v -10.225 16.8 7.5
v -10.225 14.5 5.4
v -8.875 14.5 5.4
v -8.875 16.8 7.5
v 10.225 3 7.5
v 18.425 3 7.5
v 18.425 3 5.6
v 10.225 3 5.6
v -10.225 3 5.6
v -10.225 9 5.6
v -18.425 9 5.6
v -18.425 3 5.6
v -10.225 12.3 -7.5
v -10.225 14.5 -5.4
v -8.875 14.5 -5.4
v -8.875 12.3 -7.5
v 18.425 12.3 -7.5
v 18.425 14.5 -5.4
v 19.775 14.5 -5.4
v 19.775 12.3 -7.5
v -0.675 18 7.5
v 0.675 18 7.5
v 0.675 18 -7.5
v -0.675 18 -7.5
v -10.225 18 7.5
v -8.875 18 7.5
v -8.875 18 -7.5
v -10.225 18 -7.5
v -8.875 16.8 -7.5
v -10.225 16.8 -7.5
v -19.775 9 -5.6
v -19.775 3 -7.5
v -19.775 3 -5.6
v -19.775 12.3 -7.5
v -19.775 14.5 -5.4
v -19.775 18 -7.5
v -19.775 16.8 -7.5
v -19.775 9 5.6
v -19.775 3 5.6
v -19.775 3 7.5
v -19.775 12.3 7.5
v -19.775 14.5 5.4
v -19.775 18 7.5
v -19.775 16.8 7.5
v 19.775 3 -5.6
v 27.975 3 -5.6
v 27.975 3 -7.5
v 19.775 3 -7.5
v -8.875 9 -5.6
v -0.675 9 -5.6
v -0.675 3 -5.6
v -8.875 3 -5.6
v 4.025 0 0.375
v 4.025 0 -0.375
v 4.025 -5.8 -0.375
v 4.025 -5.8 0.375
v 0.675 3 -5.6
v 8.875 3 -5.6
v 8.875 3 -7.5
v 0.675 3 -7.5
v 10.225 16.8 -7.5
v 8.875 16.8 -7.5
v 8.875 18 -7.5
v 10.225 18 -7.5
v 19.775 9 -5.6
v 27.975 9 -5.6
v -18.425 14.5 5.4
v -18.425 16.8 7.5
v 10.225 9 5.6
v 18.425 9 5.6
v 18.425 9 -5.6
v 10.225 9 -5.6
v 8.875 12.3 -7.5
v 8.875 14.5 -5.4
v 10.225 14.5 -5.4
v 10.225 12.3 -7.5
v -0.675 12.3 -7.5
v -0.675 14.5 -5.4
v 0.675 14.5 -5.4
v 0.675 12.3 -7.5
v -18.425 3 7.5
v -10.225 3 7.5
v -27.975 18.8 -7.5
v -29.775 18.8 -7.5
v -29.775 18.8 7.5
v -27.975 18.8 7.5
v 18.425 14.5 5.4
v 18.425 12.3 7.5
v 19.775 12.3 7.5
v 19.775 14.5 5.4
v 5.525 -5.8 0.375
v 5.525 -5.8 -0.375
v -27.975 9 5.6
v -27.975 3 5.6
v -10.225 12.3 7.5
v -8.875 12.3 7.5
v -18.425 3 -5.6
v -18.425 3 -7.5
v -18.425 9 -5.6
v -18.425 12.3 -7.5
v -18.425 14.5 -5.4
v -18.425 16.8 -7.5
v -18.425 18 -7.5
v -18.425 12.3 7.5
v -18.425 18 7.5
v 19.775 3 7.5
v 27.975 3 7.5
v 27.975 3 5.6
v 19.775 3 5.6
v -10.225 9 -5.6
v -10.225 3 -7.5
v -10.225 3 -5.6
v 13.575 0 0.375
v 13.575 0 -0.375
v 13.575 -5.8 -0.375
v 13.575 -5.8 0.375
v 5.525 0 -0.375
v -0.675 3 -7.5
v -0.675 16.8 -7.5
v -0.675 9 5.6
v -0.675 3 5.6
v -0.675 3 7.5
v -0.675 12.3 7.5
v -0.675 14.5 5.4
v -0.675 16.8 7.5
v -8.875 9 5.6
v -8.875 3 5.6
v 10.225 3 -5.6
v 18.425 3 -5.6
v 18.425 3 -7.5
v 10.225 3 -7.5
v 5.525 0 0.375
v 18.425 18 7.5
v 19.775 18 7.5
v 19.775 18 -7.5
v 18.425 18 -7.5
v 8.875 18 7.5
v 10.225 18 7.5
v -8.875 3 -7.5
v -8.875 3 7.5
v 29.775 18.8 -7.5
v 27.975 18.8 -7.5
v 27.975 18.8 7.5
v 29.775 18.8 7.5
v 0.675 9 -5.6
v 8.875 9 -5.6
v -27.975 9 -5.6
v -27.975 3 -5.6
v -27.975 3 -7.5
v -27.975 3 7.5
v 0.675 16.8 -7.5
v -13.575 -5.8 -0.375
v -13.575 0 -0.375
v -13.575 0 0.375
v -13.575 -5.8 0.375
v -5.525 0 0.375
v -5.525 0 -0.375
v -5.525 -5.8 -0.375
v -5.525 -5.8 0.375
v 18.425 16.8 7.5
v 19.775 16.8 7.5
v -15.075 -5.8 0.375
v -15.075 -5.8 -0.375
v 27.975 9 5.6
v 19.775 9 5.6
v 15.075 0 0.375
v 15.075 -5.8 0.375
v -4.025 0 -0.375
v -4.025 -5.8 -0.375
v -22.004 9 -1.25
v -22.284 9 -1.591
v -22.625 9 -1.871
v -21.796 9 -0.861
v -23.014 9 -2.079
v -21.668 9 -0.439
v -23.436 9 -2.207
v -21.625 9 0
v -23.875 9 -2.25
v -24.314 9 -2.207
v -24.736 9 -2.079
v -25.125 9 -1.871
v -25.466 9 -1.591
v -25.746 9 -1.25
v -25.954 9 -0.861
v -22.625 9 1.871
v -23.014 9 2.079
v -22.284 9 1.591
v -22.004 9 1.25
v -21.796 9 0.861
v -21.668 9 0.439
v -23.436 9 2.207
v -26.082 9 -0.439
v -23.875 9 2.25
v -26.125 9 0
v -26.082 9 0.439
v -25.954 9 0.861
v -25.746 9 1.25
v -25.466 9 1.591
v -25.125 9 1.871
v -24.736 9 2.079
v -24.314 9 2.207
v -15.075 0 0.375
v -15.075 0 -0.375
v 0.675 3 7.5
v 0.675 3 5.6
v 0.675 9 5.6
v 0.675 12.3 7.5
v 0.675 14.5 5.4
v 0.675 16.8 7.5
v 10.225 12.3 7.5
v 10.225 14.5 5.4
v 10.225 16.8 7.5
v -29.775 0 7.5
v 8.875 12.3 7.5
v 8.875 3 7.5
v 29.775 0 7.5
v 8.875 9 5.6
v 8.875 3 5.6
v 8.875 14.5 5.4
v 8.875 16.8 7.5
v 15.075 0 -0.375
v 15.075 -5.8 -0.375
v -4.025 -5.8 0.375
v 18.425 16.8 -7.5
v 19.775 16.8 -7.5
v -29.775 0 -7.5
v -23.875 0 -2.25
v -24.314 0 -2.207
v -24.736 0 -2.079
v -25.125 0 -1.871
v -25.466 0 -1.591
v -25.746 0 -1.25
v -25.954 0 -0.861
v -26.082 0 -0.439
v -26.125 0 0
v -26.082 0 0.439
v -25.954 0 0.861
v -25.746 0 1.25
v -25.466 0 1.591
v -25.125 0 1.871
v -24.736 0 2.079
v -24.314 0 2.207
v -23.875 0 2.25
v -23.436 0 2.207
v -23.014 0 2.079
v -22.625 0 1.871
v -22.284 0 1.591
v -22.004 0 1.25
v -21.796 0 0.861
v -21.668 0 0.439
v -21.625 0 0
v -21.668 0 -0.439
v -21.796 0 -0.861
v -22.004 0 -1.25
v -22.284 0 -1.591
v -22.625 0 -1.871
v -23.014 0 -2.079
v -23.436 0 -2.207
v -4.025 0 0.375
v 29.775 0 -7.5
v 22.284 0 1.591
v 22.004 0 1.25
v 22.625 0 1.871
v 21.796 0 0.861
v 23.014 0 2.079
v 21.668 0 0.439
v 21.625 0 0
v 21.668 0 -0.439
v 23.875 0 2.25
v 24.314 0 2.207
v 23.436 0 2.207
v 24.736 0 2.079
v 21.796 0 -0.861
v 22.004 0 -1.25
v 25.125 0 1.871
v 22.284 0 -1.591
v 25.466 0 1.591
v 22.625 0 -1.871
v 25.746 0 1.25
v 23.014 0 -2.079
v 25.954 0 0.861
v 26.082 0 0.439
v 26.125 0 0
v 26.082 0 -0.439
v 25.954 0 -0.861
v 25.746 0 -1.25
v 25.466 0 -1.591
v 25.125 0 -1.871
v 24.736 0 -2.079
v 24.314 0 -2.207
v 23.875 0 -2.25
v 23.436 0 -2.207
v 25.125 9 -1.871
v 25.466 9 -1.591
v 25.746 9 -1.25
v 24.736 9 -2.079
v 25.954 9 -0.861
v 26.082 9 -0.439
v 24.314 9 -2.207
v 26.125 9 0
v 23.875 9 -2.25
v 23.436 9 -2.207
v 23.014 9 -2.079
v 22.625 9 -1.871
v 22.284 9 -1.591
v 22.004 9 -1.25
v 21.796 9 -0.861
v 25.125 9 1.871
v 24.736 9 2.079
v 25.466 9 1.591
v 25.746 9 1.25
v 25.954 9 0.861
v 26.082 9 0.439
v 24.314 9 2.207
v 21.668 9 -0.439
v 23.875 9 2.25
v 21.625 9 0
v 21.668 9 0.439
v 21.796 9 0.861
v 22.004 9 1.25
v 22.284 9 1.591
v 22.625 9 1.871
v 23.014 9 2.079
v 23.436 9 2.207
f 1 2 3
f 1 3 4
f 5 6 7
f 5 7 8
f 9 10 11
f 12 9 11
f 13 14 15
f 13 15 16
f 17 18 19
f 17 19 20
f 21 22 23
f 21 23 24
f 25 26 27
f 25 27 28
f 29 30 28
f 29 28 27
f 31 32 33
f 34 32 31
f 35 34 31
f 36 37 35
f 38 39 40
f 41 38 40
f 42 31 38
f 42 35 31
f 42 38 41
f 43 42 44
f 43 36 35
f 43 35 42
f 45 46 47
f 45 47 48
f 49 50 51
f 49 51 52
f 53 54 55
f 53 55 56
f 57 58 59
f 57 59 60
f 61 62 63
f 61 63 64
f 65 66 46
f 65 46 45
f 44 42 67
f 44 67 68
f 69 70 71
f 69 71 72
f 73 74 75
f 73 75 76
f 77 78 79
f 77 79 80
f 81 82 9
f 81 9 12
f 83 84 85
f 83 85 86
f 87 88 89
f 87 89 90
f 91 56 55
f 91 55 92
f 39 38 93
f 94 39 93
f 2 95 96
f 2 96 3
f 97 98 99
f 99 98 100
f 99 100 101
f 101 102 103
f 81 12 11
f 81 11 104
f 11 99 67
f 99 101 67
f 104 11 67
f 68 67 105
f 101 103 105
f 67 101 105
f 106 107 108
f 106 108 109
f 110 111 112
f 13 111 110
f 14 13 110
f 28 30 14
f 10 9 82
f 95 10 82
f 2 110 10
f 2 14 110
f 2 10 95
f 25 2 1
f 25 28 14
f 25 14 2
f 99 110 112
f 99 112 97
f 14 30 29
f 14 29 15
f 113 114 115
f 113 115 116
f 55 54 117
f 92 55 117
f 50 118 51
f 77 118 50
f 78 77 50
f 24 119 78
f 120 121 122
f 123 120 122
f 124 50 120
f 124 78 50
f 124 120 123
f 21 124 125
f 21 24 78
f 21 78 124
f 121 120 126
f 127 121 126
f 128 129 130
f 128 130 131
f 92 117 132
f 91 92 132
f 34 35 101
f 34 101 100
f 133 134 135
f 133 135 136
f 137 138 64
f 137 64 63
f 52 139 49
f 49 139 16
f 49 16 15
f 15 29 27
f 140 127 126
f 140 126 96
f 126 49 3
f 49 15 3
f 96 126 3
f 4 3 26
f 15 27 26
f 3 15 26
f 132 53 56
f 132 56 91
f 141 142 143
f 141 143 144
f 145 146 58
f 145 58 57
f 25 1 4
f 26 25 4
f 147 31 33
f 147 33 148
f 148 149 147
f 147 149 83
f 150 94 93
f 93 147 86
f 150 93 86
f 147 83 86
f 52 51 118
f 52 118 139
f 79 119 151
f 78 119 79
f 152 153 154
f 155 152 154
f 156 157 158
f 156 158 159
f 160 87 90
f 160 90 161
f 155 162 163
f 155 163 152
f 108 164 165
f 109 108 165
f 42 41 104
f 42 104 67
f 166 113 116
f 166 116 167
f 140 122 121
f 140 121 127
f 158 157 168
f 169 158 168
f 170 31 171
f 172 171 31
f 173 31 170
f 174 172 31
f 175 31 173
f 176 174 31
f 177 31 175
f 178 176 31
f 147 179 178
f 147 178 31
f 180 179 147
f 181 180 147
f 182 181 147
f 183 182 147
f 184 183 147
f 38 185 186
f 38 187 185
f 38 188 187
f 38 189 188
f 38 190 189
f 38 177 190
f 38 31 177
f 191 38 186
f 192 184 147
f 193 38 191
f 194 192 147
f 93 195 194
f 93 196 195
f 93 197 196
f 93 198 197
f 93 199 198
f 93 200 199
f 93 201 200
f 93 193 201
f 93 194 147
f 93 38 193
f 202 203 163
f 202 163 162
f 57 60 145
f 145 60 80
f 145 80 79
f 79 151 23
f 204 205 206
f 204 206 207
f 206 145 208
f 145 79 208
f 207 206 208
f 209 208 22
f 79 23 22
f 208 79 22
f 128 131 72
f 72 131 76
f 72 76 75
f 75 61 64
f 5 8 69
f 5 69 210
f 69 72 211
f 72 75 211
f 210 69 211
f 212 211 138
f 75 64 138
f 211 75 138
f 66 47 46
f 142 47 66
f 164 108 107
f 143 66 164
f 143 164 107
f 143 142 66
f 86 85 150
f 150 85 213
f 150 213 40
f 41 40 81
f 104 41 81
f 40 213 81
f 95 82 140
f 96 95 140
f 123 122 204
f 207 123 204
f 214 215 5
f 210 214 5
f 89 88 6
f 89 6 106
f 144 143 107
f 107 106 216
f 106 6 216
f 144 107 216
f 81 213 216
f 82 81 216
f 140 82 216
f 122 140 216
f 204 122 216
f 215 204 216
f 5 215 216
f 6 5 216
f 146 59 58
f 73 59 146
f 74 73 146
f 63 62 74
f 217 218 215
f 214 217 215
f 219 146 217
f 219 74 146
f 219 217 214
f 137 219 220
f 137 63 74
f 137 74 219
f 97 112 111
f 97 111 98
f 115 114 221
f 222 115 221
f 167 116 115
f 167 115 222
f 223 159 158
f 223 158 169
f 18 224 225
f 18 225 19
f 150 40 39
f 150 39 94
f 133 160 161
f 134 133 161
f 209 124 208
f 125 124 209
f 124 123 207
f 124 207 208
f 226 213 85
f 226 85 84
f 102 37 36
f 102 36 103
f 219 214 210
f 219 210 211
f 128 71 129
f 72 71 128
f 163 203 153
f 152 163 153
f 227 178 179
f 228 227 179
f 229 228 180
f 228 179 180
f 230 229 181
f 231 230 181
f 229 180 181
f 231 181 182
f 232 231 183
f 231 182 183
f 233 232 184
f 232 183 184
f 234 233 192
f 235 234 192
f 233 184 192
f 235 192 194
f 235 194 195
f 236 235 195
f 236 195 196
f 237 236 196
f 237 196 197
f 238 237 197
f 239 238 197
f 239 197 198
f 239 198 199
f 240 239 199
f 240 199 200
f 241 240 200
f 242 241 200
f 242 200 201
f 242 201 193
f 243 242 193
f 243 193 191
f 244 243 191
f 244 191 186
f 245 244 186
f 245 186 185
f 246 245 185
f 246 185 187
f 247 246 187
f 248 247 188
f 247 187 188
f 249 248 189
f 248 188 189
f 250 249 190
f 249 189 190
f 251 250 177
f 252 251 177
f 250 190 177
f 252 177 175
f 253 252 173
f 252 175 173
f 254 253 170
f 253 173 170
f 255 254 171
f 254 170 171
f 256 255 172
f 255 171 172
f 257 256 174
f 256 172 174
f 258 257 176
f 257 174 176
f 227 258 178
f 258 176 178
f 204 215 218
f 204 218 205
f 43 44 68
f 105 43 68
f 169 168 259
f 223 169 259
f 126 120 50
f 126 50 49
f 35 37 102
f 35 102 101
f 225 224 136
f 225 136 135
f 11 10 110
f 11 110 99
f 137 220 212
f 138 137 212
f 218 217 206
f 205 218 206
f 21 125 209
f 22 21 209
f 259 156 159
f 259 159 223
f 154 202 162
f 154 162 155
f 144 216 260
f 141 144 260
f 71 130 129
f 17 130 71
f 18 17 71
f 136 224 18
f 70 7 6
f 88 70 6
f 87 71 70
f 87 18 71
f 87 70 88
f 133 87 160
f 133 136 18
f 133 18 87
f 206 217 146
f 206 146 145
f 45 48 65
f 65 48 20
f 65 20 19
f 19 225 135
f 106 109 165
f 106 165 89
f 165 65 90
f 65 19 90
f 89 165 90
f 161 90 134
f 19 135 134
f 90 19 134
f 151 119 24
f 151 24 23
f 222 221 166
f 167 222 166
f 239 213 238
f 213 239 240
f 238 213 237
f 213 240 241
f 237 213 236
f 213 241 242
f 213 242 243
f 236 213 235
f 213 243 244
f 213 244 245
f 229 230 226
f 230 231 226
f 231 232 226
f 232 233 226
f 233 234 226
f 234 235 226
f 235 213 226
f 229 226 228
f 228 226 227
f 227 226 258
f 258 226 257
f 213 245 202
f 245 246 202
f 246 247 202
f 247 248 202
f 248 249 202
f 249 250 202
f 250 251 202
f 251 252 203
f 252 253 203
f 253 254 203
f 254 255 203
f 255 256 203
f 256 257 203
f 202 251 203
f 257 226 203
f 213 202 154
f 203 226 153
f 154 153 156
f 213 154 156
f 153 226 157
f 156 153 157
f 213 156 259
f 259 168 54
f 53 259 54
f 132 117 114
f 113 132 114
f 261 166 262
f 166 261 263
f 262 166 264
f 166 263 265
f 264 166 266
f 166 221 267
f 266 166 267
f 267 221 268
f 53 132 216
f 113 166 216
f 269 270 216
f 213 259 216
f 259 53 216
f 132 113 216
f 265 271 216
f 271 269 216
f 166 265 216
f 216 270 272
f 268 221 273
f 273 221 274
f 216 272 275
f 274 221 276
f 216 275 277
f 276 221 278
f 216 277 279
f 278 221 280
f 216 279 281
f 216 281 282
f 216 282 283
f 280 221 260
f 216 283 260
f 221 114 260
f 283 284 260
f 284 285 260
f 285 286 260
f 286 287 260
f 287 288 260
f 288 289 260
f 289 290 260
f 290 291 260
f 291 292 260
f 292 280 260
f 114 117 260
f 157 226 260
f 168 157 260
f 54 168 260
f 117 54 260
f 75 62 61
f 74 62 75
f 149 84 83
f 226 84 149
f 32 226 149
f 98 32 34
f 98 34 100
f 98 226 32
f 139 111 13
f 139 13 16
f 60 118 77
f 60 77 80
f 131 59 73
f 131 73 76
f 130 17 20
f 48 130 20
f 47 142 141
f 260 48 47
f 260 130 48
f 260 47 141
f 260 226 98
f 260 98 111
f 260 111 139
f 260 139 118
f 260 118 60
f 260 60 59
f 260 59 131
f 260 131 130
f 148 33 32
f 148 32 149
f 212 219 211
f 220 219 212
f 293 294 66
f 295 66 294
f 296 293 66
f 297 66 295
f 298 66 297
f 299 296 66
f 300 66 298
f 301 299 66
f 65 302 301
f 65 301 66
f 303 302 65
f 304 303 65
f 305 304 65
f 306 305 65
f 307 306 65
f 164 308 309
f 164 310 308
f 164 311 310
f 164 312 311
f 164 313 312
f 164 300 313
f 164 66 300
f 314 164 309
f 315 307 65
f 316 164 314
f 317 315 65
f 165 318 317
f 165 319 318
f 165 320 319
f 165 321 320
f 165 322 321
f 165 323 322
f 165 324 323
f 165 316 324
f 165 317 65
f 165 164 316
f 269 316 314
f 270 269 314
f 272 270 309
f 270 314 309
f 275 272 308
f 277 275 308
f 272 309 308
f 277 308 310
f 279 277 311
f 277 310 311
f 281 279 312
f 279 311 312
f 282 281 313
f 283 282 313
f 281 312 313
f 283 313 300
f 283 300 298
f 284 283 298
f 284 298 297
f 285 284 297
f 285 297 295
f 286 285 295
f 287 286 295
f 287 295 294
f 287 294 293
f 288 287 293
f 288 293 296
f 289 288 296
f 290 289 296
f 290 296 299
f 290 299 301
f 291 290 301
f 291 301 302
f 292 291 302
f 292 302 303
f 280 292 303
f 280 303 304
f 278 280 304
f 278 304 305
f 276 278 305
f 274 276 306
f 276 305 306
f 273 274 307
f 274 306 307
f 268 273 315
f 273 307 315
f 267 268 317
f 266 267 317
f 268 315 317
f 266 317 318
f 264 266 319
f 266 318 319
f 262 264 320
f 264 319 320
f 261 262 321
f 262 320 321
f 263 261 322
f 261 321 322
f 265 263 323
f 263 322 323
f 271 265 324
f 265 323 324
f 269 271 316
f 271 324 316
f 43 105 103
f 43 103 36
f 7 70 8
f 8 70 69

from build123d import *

# Parameters (mm, degrees)
SKETCH_1_W          = 59.55
SKETCH_1_H          = 15
EXTRUDE_1_DEPTH     = 18.8
SKETCH_2_W          = 55.95
SKETCH_2_H          = 15
CUT_EXTRUDE_1_DEPTH = 0.8
SKETCH_4_W          = 8.2
SKETCH_4_H          = 15
CUT_EXTRUDE_2_DEPTH = 9
SKETCH_5_W          = 8.2
SKETCH_5_H          = 1.9
CUT_EXTRUDE_3_DEPTH = 15
SKETCH_6_W          = 1.5
SKETCH_6_H          = 0.75
EXTRUDE_2_DEPTH     = 5.8
SKETCH_7_R          = 2.25
CUT_EXTRUDE_4_DEPTH = 35.085783327
CUT_EXTRUDE_START   = -39.55
CUT_EXTRUDE_5_DEPTH = 39.55


with BuildPart() as part:
    # 草图1 → 拉伸1 (new body)
    with BuildSketch(Plane(origin=(0, 0, 0), x_dir=(1, 0, 0), z_dir=(0, 1, 0))):
        Rectangle(SKETCH_1_W, SKETCH_1_H)
    extrude(amount=EXTRUDE_1_DEPTH)

    # 草图2 → 切除-拉伸1 (cut)
    with BuildSketch(Plane(origin=(0, 18.8, 0), x_dir=(-1, 0, 0), z_dir=(0, 1, 0))):
        Rectangle(SKETCH_2_W, SKETCH_2_H)
    extrude(amount=-CUT_EXTRUDE_1_DEPTH, mode=Mode.SUBTRACT)

    # 草图4 → 切除-拉伸2 (cut)
    with BuildSketch(Plane(origin=(0, 18, 0), x_dir=(-1, 0, 0), z_dir=(0, 1, 0))):
        with Locations((-23.875, 0)):
            Rectangle(SKETCH_4_W, SKETCH_4_H)
        with Locations((-14.325, 0)):
            Rectangle(SKETCH_4_W, SKETCH_4_H)
        with Locations((-4.775, 0)):
            Rectangle(SKETCH_4_W, SKETCH_4_H)
        with Locations((4.775, 0)):
            Rectangle(SKETCH_4_W, SKETCH_4_H)
        with Locations((14.325, 0)):
            Rectangle(SKETCH_4_W, SKETCH_4_H)
        with Locations((23.875, 0)):
            Rectangle(SKETCH_4_W, SKETCH_4_H)
    extrude(amount=-CUT_EXTRUDE_2_DEPTH, mode=Mode.SUBTRACT)

    # 草图5 → 切除-拉伸3 (cut)
    with BuildSketch(Plane(origin=(0, 18, 0), x_dir=(-1, 0, 0), z_dir=(0, 1, 0))):
        with Locations((23.875, -6.55)):
            Rectangle(SKETCH_5_W, SKETCH_5_H)
        with Locations((23.875, 6.55)):
            Rectangle(SKETCH_5_W, SKETCH_5_H)
        with Locations((14.325, -6.55)):
            Rectangle(SKETCH_5_W, SKETCH_5_H)
        with Locations((14.325, 6.55)):
            Rectangle(SKETCH_5_W, SKETCH_5_H)
        with Locations((4.775, -6.55)):
            Rectangle(SKETCH_5_W, SKETCH_5_H)
        with Locations((4.775, 6.55)):
            Rectangle(SKETCH_5_W, SKETCH_5_H)
        with Locations((-4.775, -6.55)):
            Rectangle(SKETCH_5_W, SKETCH_5_H)
        with Locations((-4.775, 6.55)):
            Rectangle(SKETCH_5_W, SKETCH_5_H)
        with Locations((-14.325, -6.55)):
            Rectangle(SKETCH_5_W, SKETCH_5_H)
        with Locations((-14.325, 6.55)):
            Rectangle(SKETCH_5_W, SKETCH_5_H)
        with Locations((-23.875, -6.55)):
            Rectangle(SKETCH_5_W, SKETCH_5_H)
        with Locations((-23.875, 6.55)):
            Rectangle(SKETCH_5_W, SKETCH_5_H)
    extrude(amount=-CUT_EXTRUDE_3_DEPTH, mode=Mode.SUBTRACT)

    # 草图6 → 拉伸2 (add)
    with BuildSketch(Plane.XZ):
        with Locations((-4.775, 0)):
            Rectangle(SKETCH_6_W, SKETCH_6_H)
        with Locations((4.775, 0)):
            Rectangle(SKETCH_6_W, SKETCH_6_H)
        with Locations((14.325, 0)):
            Rectangle(SKETCH_6_W, SKETCH_6_H)
        with Locations((-14.325, 0)):
            Rectangle(SKETCH_6_W, SKETCH_6_H)
    extrude(amount=EXTRUDE_2_DEPTH)

    # 草图7 → 切除-拉伸4 (cut, through all)
    with BuildSketch(Plane(origin=(0, 9, 0), x_dir=(-1, 0, 0), z_dir=(0, 1, 0))):
        with Locations(Location((-23.875, 0, 0), (0, 0, 90))):
            Circle(SKETCH_7_R)
        with Locations(Location((23.875, 0, 0), (0, 0, 270))):
            Circle(SKETCH_7_R)
    extrude(amount=-CUT_EXTRUDE_4_DEPTH, mode=Mode.SUBTRACT)

    # 草图8 → 切除-拉伸5 (cut)
    with BuildSketch(Plane(origin=(19.775, 0, 0), x_dir=(0, 0, -1), z_dir=(1, 0, 0)).offset(CUT_EXTRUDE_START)):
        Polygon((7.5, 16.8), (5.4, 14.5), (7.5, 12.3), align=None)
        Polygon((-7.5, 16.8), (-7.5, 12.3), (-5.4, 14.5), align=None)
    extrude(amount=CUT_EXTRUDE_5_DEPTH, mode=Mode.SUBTRACT)


solid = part.part
